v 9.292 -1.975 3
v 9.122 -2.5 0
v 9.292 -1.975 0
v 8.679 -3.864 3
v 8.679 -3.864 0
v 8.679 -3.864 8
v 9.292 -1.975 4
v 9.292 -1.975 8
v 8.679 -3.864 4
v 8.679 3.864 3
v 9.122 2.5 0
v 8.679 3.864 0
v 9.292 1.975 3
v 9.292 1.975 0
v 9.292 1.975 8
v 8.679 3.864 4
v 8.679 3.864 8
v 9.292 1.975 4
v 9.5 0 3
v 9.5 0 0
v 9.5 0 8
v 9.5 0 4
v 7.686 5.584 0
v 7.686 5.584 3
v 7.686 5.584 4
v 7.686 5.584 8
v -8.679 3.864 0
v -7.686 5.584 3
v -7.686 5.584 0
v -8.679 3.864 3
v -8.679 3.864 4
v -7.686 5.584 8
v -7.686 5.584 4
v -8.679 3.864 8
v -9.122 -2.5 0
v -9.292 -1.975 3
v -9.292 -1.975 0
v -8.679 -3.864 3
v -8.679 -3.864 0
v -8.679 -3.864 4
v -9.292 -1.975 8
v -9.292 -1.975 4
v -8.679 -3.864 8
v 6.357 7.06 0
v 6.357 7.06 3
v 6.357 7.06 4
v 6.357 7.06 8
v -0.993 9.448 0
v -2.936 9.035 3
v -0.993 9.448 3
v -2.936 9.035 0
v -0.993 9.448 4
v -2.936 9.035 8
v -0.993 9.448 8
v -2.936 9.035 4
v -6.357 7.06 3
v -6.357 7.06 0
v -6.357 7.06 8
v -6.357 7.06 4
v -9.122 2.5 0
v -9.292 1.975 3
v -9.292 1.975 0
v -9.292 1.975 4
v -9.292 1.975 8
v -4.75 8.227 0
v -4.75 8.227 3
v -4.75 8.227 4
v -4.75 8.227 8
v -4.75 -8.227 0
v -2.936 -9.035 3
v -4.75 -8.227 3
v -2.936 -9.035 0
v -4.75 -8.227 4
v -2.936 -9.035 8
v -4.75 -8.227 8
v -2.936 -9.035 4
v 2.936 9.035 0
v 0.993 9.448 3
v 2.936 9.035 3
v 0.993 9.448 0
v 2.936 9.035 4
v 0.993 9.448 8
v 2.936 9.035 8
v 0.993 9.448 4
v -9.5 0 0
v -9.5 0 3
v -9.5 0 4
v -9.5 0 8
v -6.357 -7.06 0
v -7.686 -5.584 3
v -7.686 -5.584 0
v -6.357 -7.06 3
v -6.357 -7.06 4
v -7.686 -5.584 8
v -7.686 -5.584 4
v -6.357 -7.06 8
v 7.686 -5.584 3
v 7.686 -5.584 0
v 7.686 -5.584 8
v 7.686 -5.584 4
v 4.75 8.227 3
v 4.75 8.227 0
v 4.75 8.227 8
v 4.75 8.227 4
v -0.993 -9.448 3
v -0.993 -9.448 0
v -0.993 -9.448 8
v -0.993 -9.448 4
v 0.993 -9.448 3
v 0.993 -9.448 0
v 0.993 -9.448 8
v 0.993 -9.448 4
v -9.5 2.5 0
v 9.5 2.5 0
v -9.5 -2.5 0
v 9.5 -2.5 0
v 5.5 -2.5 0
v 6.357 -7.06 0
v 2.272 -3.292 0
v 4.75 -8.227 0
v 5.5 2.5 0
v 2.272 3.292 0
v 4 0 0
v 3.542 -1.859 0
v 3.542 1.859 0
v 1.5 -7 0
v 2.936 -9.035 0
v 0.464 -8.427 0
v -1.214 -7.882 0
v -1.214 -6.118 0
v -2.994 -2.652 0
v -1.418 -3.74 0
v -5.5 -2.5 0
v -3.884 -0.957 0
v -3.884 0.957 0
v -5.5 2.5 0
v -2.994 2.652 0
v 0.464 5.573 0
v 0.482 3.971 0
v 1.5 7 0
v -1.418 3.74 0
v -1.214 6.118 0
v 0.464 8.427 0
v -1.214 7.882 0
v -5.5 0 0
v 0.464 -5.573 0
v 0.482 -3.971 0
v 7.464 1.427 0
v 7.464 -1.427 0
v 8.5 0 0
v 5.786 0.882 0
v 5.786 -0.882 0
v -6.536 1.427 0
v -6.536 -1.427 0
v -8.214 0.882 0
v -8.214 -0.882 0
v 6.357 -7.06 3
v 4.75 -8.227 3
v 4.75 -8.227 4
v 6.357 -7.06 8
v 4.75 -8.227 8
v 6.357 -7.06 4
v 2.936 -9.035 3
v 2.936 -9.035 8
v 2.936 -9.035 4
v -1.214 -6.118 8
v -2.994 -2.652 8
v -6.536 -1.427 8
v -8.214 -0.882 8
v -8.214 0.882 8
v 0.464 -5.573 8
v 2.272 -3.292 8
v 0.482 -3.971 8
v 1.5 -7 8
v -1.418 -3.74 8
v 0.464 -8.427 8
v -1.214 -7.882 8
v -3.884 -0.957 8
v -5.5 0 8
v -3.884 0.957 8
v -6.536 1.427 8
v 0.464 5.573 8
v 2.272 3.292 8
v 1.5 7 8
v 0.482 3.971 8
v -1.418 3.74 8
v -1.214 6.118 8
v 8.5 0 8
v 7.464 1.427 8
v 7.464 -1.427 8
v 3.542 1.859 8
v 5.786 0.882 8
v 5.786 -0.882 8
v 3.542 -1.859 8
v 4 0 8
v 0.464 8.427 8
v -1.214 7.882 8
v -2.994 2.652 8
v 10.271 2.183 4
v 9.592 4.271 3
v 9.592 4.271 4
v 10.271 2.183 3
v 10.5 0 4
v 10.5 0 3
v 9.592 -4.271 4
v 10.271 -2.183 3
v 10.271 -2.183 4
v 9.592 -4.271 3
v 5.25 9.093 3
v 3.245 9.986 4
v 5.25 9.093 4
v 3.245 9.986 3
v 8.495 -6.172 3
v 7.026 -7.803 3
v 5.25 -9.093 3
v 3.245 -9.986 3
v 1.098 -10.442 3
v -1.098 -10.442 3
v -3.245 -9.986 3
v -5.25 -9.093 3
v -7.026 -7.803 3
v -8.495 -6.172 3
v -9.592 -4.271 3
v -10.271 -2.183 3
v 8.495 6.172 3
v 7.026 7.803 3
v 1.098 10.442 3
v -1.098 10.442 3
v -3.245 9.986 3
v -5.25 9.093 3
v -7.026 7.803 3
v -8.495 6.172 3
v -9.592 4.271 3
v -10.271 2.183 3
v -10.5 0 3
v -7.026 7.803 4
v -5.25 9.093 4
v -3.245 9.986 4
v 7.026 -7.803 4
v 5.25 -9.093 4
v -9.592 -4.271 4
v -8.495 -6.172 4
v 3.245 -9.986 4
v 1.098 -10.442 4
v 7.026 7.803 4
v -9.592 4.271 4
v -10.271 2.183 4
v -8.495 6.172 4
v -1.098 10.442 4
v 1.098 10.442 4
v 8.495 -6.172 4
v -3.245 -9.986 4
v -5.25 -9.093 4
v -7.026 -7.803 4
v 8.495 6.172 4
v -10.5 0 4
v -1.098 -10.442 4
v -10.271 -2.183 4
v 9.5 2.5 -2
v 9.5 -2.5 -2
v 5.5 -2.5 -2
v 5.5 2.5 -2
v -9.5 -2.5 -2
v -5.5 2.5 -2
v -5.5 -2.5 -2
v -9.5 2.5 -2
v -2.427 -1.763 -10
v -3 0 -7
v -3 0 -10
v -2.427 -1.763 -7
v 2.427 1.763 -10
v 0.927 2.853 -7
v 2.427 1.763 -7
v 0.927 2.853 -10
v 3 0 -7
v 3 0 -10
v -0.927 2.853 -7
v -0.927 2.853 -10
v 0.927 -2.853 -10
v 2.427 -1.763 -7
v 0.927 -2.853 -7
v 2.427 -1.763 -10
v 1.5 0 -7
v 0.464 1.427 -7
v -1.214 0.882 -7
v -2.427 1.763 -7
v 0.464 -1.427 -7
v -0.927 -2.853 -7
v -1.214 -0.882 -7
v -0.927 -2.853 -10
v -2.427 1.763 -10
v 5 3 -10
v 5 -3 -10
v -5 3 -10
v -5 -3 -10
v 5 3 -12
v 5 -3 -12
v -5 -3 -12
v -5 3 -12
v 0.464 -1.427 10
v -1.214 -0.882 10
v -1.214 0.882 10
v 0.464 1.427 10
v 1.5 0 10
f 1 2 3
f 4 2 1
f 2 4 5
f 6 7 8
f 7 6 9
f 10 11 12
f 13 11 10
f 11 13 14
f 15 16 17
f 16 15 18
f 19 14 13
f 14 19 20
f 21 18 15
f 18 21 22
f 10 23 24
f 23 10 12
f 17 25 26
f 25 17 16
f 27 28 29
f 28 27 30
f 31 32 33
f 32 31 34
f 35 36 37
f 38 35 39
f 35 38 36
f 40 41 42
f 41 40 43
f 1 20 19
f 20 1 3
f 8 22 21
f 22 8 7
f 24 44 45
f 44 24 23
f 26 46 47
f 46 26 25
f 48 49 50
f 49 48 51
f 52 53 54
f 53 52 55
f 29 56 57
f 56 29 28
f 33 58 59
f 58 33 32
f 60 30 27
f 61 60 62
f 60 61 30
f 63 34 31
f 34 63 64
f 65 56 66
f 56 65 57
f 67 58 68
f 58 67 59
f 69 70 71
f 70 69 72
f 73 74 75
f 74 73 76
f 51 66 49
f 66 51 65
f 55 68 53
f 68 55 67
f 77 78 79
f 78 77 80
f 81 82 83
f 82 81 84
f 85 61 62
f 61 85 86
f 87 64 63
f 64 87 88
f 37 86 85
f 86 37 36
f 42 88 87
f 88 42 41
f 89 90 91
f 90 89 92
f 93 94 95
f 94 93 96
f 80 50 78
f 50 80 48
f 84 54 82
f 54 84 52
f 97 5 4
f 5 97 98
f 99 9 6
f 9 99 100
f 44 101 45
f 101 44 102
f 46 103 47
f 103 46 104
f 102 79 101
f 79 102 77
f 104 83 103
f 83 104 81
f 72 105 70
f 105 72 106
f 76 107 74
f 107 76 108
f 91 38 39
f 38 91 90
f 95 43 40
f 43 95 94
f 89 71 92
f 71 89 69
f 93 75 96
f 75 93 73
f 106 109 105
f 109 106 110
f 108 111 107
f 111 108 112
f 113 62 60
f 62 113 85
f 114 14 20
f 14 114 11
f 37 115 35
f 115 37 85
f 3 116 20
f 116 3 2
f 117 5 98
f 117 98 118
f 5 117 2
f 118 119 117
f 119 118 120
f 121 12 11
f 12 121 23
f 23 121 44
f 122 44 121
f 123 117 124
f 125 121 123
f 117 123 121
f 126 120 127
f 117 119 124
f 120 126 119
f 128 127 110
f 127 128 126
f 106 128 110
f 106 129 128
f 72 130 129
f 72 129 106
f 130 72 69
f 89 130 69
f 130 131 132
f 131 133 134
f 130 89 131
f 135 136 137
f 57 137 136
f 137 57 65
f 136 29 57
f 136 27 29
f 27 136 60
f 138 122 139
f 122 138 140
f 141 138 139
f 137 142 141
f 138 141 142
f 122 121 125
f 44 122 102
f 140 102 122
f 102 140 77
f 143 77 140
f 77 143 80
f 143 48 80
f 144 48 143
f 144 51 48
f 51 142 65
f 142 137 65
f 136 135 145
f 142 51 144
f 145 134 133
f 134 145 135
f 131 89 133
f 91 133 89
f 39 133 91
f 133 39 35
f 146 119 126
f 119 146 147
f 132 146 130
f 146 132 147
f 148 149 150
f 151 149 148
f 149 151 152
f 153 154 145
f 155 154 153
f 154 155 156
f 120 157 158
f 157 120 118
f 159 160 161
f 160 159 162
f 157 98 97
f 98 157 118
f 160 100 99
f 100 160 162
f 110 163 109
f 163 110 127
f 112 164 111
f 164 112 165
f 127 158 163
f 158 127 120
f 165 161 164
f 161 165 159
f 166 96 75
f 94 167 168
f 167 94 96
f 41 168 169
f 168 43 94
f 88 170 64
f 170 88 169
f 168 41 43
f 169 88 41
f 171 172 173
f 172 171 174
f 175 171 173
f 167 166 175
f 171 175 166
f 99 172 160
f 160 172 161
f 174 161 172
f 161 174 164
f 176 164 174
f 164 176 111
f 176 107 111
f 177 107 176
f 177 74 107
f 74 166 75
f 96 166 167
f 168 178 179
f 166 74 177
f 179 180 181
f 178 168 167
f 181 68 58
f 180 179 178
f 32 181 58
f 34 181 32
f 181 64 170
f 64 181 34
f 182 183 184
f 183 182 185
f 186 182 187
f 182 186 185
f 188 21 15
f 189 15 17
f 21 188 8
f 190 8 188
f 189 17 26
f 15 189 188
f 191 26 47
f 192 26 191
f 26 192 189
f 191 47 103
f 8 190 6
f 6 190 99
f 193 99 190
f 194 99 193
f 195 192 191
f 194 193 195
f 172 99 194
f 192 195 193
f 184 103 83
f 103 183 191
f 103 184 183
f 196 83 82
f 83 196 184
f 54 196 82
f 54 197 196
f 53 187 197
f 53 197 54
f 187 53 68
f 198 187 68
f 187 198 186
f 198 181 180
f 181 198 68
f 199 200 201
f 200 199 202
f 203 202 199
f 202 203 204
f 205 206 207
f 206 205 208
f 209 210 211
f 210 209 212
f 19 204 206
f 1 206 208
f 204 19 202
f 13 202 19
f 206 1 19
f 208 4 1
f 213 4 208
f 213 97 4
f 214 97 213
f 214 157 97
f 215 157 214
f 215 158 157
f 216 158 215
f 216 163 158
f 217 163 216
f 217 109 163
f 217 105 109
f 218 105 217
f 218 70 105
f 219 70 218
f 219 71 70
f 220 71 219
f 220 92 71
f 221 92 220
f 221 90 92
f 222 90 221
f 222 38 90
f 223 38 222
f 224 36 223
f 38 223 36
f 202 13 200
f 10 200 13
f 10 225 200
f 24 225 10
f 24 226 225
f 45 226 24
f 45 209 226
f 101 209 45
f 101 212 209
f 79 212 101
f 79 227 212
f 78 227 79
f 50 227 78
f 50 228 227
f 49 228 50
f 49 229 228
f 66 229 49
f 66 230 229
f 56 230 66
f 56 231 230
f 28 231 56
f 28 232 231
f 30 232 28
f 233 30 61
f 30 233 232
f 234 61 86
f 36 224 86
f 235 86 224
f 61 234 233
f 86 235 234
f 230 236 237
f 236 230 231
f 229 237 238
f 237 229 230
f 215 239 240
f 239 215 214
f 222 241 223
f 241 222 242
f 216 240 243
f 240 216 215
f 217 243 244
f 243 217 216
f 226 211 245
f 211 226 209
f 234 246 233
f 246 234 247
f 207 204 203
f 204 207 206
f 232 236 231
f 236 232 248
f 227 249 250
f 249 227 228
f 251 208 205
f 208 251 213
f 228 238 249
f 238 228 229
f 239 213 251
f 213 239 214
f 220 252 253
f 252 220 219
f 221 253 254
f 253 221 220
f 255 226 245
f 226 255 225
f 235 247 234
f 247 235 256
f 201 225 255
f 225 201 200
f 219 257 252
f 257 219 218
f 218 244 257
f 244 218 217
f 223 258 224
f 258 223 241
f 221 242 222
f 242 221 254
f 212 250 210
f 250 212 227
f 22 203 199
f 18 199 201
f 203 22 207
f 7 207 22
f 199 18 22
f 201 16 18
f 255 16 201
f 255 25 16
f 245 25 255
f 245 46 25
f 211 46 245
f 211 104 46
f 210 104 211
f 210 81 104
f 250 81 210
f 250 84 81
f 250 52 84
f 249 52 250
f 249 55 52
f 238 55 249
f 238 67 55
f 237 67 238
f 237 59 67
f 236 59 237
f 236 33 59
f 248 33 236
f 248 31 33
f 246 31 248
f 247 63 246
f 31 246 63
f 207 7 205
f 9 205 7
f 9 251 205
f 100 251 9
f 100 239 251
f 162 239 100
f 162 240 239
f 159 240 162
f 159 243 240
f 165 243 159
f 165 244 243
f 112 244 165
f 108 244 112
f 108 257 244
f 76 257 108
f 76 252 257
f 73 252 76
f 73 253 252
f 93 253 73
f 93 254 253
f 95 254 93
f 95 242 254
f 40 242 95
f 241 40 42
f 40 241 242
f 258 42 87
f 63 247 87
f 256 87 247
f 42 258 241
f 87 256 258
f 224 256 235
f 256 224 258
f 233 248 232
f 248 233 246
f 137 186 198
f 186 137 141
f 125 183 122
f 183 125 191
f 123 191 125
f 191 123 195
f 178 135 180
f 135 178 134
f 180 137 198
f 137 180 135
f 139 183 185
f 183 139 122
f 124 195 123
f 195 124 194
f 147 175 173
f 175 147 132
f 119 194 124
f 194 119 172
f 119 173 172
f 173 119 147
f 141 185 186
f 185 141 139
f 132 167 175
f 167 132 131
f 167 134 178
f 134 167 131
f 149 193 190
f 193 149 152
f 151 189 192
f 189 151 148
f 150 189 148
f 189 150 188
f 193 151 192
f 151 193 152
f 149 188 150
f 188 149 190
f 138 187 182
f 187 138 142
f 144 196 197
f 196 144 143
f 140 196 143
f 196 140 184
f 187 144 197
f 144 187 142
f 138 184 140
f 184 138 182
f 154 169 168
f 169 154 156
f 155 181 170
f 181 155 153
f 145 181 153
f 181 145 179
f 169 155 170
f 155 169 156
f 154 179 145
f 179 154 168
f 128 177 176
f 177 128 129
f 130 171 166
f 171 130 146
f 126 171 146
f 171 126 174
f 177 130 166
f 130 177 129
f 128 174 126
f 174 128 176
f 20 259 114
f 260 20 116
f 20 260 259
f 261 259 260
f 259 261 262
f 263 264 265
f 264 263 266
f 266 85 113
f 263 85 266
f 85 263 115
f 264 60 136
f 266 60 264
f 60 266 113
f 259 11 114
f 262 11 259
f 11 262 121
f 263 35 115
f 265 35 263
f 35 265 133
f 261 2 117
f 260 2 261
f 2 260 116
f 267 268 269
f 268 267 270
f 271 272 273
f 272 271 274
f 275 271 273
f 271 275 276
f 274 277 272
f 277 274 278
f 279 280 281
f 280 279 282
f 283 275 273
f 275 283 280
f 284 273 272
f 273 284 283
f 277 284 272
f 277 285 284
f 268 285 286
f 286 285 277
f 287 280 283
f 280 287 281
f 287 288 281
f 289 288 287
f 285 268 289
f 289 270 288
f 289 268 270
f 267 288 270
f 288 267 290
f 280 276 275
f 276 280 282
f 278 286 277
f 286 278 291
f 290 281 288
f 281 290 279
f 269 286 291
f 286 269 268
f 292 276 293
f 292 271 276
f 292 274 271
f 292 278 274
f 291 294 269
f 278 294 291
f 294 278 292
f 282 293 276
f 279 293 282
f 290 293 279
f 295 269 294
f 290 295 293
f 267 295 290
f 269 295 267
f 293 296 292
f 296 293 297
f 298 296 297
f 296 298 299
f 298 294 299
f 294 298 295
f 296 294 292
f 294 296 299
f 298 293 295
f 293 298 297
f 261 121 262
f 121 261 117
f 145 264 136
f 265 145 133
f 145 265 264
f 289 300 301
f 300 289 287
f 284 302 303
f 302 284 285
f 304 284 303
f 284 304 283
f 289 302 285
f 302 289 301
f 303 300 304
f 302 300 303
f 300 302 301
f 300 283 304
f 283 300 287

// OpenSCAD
h = 19;
hr = h + 2;
ht = 6;
alu=2;
d=2.5;

difference() {
union(){
cylinder(r=h/2,h=ht);
translate([0,0,ht]) cylinder(r=h/2,h=alu);
translate([0,0,ht/2]) cylinder(r=hr/2,h=1);
}

translate([0,0,-20])cylinder(r=4,h=40);
translate([h/2-d,0,-20])cylinder(r=1.5,h=40);
translate([0,h/2-d,-20])cylinder(r=1.5,h=40);
translate([-h/2+d,0,-20])cylinder(r=1.5,h=40);
translate([0,-h/2+d,-20])cylinder(r=1.5,h=40);

}

translate([0,0,-10]) cylinder(r=3/2,h=20);

difference(){
union() {
    
translate([-h/2,-2.5,-2])cube([h,5,2]);
translate([0,0,-10])cylinder(r=3,h=3);
translate([-10/2,-3,-2-10])cube([10,6,2]);
}
translate([-(h-8)/2,-3,-3])cube([h-8,6,4]);
}
